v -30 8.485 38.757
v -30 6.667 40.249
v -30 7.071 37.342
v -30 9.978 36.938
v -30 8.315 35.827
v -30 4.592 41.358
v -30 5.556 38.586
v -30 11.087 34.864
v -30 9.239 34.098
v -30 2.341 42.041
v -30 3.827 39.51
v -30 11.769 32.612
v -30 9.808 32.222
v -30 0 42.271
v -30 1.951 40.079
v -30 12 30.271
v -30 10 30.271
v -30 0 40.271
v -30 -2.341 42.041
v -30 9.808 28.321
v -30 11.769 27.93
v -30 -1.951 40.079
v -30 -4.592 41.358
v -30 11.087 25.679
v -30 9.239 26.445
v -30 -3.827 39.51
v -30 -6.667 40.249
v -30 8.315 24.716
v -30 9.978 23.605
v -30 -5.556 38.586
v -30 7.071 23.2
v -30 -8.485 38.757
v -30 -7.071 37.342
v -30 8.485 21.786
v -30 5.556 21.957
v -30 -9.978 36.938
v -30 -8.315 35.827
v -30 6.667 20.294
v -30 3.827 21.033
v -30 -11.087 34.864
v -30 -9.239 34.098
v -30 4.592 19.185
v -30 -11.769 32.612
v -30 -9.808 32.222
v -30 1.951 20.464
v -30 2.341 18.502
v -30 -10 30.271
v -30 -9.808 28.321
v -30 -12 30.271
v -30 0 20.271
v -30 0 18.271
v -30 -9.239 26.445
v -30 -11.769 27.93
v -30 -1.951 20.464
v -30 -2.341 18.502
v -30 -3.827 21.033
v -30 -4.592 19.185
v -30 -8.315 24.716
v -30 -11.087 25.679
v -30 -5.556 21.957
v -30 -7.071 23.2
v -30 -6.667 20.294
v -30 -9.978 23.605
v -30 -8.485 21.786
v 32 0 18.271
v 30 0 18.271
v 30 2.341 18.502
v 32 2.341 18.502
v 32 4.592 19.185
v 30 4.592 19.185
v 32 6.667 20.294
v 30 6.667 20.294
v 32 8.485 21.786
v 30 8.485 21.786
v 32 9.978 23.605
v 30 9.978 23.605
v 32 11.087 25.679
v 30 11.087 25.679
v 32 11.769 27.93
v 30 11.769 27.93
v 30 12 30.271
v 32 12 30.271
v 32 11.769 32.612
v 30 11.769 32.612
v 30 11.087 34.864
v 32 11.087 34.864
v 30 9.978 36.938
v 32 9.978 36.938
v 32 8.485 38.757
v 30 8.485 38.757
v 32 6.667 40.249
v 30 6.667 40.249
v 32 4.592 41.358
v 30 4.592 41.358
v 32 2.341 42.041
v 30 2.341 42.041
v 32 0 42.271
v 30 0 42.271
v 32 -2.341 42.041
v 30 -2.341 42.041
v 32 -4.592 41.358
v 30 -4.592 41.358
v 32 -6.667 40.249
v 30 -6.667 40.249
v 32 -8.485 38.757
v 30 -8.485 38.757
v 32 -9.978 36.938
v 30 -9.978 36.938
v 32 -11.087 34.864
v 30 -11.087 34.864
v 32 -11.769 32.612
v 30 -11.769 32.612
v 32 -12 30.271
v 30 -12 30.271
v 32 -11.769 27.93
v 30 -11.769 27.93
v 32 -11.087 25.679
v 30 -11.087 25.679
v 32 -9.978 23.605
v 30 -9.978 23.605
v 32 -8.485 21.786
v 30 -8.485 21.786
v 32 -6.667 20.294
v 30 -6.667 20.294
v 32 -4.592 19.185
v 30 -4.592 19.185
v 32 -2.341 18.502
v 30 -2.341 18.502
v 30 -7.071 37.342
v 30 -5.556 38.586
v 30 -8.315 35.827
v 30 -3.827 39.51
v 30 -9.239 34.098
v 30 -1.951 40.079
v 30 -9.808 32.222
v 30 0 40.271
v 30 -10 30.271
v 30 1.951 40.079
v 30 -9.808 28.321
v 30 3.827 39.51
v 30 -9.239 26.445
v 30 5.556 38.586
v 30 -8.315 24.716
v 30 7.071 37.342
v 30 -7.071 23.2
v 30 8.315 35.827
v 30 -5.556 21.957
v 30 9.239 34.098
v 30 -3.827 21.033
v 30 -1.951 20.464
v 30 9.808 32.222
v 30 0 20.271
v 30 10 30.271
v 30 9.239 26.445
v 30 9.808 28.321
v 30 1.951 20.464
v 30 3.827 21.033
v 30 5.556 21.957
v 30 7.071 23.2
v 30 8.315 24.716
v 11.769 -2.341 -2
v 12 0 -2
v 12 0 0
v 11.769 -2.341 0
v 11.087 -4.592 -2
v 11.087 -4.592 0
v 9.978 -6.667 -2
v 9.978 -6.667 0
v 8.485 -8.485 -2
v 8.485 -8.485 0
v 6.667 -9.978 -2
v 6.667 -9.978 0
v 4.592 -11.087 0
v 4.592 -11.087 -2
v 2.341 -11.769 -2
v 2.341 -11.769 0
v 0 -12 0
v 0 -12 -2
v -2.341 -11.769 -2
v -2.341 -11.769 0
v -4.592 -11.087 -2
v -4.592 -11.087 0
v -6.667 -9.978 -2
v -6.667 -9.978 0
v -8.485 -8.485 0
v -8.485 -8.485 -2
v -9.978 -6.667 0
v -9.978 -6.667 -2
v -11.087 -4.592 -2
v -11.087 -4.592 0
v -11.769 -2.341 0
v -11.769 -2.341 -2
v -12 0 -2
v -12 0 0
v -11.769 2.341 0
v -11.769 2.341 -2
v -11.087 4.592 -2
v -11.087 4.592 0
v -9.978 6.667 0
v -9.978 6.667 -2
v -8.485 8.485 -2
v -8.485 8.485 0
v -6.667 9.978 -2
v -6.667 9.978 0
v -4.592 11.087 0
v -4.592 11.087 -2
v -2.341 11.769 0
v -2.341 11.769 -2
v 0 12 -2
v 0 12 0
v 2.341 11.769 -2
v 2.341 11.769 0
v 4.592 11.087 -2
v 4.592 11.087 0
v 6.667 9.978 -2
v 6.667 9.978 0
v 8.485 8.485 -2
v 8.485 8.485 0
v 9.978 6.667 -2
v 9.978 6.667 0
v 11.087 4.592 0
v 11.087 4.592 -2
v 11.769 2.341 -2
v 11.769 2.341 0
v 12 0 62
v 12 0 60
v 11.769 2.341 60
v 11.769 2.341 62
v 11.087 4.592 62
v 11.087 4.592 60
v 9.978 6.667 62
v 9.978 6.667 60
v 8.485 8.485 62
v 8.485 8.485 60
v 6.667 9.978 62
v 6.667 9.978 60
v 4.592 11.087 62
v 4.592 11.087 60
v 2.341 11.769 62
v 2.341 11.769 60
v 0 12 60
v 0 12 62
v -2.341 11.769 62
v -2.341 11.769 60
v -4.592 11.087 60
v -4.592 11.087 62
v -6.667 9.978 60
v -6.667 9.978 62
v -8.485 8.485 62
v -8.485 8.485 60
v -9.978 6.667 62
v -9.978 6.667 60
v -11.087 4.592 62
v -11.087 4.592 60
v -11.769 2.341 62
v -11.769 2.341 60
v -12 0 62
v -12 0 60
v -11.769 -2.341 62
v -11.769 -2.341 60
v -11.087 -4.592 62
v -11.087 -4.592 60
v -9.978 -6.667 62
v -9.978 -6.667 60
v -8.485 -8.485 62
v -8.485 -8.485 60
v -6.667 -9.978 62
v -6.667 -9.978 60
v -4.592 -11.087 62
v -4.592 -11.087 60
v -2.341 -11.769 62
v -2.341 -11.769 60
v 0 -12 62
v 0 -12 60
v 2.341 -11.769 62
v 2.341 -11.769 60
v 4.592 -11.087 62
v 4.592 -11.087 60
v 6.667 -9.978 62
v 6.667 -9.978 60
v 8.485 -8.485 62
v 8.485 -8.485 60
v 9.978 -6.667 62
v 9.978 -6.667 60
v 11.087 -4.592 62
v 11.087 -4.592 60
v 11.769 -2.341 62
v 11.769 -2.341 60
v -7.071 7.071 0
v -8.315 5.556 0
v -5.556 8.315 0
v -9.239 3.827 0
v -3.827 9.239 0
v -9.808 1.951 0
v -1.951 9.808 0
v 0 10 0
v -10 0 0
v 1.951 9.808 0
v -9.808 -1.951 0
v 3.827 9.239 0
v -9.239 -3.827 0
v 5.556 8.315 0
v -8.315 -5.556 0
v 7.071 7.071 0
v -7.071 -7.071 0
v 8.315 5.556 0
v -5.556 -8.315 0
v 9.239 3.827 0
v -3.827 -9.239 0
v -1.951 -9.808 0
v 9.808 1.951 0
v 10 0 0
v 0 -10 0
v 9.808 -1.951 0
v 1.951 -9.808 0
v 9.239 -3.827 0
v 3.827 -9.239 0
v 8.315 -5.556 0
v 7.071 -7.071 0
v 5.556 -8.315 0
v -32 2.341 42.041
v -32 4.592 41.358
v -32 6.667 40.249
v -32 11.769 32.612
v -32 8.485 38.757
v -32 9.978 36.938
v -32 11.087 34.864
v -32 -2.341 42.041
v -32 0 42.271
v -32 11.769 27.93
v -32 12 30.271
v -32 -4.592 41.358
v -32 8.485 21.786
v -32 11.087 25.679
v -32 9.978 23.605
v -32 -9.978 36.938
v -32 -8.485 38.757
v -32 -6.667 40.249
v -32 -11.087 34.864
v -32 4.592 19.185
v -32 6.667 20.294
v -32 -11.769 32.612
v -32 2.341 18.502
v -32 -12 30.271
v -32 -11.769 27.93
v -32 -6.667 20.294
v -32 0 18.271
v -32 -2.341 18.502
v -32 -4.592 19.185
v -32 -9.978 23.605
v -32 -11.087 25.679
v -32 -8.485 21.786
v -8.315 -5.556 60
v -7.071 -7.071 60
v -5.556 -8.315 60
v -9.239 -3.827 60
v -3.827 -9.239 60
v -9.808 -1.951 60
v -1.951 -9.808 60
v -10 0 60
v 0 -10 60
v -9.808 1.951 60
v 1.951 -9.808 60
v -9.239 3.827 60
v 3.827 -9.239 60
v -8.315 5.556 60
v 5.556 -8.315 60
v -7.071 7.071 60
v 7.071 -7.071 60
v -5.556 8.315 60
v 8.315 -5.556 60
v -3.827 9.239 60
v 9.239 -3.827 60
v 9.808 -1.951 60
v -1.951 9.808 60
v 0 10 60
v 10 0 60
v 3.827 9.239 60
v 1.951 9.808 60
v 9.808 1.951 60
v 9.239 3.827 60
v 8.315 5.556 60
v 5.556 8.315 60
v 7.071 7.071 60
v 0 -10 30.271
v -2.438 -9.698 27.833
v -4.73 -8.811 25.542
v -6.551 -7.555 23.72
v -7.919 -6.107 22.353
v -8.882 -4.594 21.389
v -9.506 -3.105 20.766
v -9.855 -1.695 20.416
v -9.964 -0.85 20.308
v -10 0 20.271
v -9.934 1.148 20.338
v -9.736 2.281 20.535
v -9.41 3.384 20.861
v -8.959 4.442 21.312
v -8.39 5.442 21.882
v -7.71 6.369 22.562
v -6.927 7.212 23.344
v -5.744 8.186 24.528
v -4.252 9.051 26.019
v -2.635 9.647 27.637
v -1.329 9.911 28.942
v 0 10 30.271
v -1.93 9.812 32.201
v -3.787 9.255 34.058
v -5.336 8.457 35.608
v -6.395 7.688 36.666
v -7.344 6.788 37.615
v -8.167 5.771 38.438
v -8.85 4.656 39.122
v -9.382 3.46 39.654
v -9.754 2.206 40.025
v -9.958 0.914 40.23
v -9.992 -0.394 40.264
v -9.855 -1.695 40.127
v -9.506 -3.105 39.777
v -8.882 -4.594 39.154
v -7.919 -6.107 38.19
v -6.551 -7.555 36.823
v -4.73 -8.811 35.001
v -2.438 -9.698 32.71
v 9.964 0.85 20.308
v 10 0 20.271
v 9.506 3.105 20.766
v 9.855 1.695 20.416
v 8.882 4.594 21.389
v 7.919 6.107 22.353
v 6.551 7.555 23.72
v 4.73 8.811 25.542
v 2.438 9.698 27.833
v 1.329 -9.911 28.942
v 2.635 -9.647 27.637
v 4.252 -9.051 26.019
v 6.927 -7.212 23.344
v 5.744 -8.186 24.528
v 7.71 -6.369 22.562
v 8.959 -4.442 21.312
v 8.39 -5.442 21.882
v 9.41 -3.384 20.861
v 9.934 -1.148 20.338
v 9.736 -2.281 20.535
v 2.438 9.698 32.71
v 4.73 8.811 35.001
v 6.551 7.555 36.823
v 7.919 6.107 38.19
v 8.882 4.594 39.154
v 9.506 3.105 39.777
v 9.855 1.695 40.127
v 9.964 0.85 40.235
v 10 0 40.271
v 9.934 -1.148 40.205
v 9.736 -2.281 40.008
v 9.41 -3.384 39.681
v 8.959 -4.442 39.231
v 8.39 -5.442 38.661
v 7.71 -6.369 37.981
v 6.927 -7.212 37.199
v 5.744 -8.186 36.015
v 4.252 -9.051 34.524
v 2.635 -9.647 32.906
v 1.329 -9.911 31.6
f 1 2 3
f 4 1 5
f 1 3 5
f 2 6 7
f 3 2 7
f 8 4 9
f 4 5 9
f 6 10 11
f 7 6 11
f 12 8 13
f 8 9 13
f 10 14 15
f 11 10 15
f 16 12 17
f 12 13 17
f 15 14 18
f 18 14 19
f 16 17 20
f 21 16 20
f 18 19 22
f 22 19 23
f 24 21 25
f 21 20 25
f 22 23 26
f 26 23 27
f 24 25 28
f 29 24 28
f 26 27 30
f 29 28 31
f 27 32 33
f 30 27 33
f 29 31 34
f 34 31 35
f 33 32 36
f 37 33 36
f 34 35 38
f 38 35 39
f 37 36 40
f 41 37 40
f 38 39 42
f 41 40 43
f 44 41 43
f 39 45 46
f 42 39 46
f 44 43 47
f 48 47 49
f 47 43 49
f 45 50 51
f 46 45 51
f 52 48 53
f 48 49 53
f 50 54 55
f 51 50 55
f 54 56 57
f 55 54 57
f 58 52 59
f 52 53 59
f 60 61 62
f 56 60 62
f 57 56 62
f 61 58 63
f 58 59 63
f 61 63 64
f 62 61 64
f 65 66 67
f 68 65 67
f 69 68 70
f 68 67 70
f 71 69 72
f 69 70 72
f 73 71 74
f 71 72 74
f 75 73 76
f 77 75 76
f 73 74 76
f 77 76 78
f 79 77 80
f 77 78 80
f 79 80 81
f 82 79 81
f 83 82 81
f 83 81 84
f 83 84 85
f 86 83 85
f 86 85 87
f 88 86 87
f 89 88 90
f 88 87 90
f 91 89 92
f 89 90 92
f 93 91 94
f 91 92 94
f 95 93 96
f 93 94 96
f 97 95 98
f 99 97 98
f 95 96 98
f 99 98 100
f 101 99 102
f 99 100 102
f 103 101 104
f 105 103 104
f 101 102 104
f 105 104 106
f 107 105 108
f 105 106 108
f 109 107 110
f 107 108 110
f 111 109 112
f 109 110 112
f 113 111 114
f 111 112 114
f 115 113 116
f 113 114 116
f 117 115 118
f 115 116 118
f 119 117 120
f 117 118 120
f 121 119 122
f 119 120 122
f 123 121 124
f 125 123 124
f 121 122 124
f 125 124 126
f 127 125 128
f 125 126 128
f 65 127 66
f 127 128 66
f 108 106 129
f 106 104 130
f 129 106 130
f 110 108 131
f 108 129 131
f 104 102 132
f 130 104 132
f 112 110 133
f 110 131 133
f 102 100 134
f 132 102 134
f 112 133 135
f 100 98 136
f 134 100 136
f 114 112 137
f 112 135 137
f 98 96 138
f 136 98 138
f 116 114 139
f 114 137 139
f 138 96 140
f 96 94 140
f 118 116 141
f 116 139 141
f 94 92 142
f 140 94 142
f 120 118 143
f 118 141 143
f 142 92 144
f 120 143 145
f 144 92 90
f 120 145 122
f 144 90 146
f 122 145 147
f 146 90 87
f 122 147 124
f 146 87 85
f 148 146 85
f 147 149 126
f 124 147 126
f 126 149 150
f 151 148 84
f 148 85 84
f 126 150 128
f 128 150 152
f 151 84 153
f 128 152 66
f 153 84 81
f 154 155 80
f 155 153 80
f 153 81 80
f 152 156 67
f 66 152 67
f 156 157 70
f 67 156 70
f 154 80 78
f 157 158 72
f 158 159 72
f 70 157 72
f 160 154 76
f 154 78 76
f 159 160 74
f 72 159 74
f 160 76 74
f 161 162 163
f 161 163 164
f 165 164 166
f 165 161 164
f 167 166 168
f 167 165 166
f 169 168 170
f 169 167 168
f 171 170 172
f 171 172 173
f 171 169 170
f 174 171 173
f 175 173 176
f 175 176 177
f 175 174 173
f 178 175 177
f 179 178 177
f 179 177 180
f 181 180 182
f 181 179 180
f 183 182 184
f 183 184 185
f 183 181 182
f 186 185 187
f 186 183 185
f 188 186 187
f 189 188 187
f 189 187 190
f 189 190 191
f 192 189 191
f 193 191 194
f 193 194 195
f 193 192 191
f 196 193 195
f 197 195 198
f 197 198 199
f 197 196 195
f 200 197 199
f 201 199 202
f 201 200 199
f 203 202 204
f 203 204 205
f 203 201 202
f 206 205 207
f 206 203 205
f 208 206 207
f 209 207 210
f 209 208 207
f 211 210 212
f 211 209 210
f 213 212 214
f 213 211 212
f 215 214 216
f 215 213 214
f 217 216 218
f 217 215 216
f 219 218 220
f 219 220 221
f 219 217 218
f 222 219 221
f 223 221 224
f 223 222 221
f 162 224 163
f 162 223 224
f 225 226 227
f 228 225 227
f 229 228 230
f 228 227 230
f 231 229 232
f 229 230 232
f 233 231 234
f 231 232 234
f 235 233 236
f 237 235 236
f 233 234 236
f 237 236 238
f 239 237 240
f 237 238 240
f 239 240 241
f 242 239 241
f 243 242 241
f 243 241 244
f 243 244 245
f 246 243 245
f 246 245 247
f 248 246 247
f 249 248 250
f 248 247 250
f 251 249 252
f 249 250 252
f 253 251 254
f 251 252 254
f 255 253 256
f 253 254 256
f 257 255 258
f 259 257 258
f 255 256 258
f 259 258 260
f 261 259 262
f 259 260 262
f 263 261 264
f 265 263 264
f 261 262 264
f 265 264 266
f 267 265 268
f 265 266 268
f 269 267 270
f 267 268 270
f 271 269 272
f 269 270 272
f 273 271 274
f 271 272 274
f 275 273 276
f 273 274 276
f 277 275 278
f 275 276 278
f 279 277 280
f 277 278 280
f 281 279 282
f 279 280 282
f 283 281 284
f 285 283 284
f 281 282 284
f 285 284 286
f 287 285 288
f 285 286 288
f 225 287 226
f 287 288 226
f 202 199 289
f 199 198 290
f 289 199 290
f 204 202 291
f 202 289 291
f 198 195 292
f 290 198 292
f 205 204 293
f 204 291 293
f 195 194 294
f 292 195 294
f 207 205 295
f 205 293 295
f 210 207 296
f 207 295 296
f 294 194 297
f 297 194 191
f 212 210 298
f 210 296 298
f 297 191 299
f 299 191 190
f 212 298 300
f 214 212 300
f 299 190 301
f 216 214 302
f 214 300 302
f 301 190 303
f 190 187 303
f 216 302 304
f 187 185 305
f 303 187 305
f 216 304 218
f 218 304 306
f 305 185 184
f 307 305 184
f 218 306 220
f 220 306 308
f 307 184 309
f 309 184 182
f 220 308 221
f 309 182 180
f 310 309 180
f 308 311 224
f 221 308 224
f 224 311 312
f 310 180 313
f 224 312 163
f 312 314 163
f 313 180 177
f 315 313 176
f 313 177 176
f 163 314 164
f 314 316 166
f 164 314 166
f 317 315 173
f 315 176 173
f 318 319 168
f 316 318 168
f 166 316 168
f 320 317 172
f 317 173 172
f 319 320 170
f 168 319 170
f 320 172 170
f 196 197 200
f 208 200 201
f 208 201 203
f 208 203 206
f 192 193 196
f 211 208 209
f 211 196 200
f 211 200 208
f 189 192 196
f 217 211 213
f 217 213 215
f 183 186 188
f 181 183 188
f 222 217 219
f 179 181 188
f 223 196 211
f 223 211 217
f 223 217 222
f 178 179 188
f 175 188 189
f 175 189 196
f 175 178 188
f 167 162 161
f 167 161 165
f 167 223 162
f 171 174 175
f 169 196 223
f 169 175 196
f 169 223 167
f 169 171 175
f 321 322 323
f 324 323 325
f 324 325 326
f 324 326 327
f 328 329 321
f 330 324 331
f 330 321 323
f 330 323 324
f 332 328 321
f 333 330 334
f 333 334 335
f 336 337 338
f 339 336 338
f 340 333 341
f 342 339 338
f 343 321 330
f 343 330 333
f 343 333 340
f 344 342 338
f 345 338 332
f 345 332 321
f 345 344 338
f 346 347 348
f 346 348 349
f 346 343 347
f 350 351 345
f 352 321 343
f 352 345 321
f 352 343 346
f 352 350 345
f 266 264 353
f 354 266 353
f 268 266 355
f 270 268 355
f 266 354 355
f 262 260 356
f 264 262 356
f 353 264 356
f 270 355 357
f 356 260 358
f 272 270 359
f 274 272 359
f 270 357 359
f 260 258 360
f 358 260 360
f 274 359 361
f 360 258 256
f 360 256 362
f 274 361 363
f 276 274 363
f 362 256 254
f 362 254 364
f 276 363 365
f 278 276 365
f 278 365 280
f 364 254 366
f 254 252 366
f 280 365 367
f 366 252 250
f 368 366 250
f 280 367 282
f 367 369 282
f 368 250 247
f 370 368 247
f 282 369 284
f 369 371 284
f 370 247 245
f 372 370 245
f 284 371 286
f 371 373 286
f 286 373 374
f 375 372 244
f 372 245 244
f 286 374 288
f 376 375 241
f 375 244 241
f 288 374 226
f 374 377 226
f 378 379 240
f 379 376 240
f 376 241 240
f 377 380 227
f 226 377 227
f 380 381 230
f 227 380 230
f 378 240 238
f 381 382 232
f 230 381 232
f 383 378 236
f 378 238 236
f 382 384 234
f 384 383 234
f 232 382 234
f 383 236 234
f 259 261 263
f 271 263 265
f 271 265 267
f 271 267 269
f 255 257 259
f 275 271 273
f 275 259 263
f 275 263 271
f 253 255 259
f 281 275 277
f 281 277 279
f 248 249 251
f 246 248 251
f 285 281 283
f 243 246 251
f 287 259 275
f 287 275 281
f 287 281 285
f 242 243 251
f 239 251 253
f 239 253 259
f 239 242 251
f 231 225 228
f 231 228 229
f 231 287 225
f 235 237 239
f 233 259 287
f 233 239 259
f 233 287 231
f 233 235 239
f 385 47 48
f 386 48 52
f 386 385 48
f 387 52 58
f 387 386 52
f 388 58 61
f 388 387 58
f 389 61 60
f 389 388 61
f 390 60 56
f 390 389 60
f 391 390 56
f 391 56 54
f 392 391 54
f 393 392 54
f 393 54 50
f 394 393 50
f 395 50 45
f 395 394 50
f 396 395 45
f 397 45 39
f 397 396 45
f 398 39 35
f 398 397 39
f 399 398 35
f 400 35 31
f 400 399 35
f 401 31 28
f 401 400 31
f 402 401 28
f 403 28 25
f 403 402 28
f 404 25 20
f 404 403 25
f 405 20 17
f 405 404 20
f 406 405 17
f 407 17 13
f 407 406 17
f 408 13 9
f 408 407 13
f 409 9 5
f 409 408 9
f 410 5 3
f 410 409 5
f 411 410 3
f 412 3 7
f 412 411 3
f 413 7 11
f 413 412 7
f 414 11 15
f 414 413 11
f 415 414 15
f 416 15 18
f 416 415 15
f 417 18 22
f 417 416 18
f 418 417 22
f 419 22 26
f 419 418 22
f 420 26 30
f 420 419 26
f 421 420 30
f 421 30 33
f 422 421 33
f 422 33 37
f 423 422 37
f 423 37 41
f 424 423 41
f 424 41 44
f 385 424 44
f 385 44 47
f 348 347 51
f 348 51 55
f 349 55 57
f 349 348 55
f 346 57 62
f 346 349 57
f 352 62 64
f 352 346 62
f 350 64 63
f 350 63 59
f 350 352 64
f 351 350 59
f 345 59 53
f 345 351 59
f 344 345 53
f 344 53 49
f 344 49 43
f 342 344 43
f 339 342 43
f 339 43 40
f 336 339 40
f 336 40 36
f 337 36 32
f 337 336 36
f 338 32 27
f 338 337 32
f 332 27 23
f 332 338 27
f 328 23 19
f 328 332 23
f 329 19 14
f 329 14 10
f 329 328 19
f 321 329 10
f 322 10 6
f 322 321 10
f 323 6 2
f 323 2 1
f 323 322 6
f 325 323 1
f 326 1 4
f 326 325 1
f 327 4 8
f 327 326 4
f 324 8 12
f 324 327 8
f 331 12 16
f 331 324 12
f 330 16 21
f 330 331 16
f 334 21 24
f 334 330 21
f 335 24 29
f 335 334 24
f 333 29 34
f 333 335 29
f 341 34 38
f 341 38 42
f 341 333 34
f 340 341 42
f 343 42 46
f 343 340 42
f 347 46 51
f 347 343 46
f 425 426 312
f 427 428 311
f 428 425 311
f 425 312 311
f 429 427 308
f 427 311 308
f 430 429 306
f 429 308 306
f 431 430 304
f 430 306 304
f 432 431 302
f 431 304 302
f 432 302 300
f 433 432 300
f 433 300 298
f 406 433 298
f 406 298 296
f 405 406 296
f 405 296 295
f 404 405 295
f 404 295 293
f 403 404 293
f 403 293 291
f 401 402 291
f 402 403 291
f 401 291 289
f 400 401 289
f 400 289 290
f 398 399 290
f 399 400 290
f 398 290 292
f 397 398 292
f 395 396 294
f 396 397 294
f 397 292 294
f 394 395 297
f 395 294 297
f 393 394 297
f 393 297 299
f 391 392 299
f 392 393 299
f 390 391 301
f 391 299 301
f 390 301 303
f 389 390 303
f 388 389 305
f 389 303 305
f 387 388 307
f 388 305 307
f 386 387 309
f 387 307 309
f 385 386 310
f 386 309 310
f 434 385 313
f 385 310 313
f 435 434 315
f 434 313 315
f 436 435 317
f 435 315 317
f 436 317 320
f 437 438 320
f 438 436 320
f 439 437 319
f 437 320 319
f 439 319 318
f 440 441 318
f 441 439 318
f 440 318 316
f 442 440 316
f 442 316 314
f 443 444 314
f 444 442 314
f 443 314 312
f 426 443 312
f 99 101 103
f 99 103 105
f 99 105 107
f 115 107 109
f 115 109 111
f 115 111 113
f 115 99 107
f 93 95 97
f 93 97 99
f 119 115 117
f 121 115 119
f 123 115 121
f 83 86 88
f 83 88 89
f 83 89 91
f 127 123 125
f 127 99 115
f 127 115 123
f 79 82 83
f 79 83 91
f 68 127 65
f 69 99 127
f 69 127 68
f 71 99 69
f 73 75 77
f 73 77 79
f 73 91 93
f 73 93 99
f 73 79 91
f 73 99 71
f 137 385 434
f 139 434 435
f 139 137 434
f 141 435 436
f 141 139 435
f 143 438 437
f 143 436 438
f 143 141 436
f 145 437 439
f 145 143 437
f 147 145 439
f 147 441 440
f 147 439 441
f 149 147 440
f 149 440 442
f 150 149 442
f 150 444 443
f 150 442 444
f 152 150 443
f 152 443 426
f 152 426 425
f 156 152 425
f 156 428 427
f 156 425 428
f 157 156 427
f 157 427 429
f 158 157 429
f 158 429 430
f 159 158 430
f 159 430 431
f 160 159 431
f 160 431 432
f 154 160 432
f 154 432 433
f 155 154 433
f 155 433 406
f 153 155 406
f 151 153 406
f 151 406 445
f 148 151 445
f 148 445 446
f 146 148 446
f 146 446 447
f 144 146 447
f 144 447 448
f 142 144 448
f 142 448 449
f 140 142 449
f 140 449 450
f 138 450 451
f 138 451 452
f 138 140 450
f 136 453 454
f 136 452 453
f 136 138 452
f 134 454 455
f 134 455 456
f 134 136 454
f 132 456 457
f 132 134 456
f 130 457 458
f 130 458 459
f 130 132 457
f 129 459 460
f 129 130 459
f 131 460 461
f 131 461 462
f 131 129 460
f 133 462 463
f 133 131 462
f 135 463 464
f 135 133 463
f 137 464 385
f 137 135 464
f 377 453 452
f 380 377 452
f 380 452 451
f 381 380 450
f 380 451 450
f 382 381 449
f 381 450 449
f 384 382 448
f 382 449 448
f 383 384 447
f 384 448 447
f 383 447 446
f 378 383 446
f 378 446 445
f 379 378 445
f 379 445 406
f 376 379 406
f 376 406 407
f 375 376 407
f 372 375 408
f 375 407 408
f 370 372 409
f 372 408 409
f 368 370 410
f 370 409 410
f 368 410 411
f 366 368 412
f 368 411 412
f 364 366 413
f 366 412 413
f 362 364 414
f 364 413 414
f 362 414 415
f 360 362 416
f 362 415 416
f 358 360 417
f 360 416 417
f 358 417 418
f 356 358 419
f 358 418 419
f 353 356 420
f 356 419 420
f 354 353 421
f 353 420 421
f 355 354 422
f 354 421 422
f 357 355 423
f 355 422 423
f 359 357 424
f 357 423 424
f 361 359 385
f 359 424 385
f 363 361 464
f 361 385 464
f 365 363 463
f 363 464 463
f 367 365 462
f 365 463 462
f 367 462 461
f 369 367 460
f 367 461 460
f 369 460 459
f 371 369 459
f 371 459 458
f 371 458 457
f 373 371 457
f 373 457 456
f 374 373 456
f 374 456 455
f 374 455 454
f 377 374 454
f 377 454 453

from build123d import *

# Parameters (mm, degrees)
SKETCH1_R           = 10
BOSS_EXTRUDE1_DEPTH = 60
SKETCH2_R           = 12
BOSS_EXTRUDE2_DEPTH = 2
BOSS_EXTRUDE3_START = 2
SKETCH3_R           = 12
BOSS_EXTRUDE3_DEPTH = 2
SKETCH4_R           = 10
BOSS_EXTRUDE4_DEPTH = 30
SKETCH5_R           = 12
BOSS_EXTRUDE5_DEPTH = 2
BOSS_EXTRUDE6_START = 2
SKETCH6_R           = 12
BOSS_EXTRUDE6_DEPTH = 2


with BuildPart() as part:
    # Sketch1 → Boss-Extrude1 (new body)
    with BuildSketch(Plane.XY):
        Circle(SKETCH1_R)
    extrude(amount=BOSS_EXTRUDE1_DEPTH)

    # Sketch2 → Boss-Extrude2 (add)
    with BuildSketch(Plane.XY.offset(60)):
        Circle(SKETCH2_R)
    extrude(amount=BOSS_EXTRUDE2_DEPTH)

    # Sketch3 → Boss-Extrude3 (add)
    with BuildSketch(Plane(origin=(0, 0, 0), x_dir=(-1, 0, 0), z_dir=(0, 0, -1)).offset(BOSS_EXTRUDE3_START)):
        with Locations(Location((0, 0, 0), (0, 0, 180))):
            Circle(SKETCH3_R)
    extrude(amount=-BOSS_EXTRUDE3_DEPTH)

    # Sketch4 → Boss-Extrude4 (add, symmetric)
    with BuildSketch(Plane(origin=(0, 0, 0), x_dir=(0, 0, -1), z_dir=(1, 0, 0))):
        with Locations(Location((-30.27140407, 0, 0), (0, 0, 270))):
            Circle(SKETCH4_R)
    extrude(amount=BOSS_EXTRUDE4_DEPTH, both=True)

    # Sketch5 → Boss-Extrude5 (add)
    with BuildSketch(Plane(origin=(30, 0, 0), x_dir=(0, 0, -1), z_dir=(1, 0, 0))):
        with Locations((-30.27140407, 0)):
            Circle(SKETCH5_R)
    extrude(amount=BOSS_EXTRUDE5_DEPTH)

    # Sketch6 → Boss-Extrude6 (add)
    with BuildSketch(Plane.ZY.offset(30).offset(BOSS_EXTRUDE6_START)):
        with Locations(Location((30.27140407, 0, 0), (0, 0, 180))):
            Circle(SKETCH6_R)
    extrude(amount=-BOSS_EXTRUDE6_DEPTH)


solid = part.part
